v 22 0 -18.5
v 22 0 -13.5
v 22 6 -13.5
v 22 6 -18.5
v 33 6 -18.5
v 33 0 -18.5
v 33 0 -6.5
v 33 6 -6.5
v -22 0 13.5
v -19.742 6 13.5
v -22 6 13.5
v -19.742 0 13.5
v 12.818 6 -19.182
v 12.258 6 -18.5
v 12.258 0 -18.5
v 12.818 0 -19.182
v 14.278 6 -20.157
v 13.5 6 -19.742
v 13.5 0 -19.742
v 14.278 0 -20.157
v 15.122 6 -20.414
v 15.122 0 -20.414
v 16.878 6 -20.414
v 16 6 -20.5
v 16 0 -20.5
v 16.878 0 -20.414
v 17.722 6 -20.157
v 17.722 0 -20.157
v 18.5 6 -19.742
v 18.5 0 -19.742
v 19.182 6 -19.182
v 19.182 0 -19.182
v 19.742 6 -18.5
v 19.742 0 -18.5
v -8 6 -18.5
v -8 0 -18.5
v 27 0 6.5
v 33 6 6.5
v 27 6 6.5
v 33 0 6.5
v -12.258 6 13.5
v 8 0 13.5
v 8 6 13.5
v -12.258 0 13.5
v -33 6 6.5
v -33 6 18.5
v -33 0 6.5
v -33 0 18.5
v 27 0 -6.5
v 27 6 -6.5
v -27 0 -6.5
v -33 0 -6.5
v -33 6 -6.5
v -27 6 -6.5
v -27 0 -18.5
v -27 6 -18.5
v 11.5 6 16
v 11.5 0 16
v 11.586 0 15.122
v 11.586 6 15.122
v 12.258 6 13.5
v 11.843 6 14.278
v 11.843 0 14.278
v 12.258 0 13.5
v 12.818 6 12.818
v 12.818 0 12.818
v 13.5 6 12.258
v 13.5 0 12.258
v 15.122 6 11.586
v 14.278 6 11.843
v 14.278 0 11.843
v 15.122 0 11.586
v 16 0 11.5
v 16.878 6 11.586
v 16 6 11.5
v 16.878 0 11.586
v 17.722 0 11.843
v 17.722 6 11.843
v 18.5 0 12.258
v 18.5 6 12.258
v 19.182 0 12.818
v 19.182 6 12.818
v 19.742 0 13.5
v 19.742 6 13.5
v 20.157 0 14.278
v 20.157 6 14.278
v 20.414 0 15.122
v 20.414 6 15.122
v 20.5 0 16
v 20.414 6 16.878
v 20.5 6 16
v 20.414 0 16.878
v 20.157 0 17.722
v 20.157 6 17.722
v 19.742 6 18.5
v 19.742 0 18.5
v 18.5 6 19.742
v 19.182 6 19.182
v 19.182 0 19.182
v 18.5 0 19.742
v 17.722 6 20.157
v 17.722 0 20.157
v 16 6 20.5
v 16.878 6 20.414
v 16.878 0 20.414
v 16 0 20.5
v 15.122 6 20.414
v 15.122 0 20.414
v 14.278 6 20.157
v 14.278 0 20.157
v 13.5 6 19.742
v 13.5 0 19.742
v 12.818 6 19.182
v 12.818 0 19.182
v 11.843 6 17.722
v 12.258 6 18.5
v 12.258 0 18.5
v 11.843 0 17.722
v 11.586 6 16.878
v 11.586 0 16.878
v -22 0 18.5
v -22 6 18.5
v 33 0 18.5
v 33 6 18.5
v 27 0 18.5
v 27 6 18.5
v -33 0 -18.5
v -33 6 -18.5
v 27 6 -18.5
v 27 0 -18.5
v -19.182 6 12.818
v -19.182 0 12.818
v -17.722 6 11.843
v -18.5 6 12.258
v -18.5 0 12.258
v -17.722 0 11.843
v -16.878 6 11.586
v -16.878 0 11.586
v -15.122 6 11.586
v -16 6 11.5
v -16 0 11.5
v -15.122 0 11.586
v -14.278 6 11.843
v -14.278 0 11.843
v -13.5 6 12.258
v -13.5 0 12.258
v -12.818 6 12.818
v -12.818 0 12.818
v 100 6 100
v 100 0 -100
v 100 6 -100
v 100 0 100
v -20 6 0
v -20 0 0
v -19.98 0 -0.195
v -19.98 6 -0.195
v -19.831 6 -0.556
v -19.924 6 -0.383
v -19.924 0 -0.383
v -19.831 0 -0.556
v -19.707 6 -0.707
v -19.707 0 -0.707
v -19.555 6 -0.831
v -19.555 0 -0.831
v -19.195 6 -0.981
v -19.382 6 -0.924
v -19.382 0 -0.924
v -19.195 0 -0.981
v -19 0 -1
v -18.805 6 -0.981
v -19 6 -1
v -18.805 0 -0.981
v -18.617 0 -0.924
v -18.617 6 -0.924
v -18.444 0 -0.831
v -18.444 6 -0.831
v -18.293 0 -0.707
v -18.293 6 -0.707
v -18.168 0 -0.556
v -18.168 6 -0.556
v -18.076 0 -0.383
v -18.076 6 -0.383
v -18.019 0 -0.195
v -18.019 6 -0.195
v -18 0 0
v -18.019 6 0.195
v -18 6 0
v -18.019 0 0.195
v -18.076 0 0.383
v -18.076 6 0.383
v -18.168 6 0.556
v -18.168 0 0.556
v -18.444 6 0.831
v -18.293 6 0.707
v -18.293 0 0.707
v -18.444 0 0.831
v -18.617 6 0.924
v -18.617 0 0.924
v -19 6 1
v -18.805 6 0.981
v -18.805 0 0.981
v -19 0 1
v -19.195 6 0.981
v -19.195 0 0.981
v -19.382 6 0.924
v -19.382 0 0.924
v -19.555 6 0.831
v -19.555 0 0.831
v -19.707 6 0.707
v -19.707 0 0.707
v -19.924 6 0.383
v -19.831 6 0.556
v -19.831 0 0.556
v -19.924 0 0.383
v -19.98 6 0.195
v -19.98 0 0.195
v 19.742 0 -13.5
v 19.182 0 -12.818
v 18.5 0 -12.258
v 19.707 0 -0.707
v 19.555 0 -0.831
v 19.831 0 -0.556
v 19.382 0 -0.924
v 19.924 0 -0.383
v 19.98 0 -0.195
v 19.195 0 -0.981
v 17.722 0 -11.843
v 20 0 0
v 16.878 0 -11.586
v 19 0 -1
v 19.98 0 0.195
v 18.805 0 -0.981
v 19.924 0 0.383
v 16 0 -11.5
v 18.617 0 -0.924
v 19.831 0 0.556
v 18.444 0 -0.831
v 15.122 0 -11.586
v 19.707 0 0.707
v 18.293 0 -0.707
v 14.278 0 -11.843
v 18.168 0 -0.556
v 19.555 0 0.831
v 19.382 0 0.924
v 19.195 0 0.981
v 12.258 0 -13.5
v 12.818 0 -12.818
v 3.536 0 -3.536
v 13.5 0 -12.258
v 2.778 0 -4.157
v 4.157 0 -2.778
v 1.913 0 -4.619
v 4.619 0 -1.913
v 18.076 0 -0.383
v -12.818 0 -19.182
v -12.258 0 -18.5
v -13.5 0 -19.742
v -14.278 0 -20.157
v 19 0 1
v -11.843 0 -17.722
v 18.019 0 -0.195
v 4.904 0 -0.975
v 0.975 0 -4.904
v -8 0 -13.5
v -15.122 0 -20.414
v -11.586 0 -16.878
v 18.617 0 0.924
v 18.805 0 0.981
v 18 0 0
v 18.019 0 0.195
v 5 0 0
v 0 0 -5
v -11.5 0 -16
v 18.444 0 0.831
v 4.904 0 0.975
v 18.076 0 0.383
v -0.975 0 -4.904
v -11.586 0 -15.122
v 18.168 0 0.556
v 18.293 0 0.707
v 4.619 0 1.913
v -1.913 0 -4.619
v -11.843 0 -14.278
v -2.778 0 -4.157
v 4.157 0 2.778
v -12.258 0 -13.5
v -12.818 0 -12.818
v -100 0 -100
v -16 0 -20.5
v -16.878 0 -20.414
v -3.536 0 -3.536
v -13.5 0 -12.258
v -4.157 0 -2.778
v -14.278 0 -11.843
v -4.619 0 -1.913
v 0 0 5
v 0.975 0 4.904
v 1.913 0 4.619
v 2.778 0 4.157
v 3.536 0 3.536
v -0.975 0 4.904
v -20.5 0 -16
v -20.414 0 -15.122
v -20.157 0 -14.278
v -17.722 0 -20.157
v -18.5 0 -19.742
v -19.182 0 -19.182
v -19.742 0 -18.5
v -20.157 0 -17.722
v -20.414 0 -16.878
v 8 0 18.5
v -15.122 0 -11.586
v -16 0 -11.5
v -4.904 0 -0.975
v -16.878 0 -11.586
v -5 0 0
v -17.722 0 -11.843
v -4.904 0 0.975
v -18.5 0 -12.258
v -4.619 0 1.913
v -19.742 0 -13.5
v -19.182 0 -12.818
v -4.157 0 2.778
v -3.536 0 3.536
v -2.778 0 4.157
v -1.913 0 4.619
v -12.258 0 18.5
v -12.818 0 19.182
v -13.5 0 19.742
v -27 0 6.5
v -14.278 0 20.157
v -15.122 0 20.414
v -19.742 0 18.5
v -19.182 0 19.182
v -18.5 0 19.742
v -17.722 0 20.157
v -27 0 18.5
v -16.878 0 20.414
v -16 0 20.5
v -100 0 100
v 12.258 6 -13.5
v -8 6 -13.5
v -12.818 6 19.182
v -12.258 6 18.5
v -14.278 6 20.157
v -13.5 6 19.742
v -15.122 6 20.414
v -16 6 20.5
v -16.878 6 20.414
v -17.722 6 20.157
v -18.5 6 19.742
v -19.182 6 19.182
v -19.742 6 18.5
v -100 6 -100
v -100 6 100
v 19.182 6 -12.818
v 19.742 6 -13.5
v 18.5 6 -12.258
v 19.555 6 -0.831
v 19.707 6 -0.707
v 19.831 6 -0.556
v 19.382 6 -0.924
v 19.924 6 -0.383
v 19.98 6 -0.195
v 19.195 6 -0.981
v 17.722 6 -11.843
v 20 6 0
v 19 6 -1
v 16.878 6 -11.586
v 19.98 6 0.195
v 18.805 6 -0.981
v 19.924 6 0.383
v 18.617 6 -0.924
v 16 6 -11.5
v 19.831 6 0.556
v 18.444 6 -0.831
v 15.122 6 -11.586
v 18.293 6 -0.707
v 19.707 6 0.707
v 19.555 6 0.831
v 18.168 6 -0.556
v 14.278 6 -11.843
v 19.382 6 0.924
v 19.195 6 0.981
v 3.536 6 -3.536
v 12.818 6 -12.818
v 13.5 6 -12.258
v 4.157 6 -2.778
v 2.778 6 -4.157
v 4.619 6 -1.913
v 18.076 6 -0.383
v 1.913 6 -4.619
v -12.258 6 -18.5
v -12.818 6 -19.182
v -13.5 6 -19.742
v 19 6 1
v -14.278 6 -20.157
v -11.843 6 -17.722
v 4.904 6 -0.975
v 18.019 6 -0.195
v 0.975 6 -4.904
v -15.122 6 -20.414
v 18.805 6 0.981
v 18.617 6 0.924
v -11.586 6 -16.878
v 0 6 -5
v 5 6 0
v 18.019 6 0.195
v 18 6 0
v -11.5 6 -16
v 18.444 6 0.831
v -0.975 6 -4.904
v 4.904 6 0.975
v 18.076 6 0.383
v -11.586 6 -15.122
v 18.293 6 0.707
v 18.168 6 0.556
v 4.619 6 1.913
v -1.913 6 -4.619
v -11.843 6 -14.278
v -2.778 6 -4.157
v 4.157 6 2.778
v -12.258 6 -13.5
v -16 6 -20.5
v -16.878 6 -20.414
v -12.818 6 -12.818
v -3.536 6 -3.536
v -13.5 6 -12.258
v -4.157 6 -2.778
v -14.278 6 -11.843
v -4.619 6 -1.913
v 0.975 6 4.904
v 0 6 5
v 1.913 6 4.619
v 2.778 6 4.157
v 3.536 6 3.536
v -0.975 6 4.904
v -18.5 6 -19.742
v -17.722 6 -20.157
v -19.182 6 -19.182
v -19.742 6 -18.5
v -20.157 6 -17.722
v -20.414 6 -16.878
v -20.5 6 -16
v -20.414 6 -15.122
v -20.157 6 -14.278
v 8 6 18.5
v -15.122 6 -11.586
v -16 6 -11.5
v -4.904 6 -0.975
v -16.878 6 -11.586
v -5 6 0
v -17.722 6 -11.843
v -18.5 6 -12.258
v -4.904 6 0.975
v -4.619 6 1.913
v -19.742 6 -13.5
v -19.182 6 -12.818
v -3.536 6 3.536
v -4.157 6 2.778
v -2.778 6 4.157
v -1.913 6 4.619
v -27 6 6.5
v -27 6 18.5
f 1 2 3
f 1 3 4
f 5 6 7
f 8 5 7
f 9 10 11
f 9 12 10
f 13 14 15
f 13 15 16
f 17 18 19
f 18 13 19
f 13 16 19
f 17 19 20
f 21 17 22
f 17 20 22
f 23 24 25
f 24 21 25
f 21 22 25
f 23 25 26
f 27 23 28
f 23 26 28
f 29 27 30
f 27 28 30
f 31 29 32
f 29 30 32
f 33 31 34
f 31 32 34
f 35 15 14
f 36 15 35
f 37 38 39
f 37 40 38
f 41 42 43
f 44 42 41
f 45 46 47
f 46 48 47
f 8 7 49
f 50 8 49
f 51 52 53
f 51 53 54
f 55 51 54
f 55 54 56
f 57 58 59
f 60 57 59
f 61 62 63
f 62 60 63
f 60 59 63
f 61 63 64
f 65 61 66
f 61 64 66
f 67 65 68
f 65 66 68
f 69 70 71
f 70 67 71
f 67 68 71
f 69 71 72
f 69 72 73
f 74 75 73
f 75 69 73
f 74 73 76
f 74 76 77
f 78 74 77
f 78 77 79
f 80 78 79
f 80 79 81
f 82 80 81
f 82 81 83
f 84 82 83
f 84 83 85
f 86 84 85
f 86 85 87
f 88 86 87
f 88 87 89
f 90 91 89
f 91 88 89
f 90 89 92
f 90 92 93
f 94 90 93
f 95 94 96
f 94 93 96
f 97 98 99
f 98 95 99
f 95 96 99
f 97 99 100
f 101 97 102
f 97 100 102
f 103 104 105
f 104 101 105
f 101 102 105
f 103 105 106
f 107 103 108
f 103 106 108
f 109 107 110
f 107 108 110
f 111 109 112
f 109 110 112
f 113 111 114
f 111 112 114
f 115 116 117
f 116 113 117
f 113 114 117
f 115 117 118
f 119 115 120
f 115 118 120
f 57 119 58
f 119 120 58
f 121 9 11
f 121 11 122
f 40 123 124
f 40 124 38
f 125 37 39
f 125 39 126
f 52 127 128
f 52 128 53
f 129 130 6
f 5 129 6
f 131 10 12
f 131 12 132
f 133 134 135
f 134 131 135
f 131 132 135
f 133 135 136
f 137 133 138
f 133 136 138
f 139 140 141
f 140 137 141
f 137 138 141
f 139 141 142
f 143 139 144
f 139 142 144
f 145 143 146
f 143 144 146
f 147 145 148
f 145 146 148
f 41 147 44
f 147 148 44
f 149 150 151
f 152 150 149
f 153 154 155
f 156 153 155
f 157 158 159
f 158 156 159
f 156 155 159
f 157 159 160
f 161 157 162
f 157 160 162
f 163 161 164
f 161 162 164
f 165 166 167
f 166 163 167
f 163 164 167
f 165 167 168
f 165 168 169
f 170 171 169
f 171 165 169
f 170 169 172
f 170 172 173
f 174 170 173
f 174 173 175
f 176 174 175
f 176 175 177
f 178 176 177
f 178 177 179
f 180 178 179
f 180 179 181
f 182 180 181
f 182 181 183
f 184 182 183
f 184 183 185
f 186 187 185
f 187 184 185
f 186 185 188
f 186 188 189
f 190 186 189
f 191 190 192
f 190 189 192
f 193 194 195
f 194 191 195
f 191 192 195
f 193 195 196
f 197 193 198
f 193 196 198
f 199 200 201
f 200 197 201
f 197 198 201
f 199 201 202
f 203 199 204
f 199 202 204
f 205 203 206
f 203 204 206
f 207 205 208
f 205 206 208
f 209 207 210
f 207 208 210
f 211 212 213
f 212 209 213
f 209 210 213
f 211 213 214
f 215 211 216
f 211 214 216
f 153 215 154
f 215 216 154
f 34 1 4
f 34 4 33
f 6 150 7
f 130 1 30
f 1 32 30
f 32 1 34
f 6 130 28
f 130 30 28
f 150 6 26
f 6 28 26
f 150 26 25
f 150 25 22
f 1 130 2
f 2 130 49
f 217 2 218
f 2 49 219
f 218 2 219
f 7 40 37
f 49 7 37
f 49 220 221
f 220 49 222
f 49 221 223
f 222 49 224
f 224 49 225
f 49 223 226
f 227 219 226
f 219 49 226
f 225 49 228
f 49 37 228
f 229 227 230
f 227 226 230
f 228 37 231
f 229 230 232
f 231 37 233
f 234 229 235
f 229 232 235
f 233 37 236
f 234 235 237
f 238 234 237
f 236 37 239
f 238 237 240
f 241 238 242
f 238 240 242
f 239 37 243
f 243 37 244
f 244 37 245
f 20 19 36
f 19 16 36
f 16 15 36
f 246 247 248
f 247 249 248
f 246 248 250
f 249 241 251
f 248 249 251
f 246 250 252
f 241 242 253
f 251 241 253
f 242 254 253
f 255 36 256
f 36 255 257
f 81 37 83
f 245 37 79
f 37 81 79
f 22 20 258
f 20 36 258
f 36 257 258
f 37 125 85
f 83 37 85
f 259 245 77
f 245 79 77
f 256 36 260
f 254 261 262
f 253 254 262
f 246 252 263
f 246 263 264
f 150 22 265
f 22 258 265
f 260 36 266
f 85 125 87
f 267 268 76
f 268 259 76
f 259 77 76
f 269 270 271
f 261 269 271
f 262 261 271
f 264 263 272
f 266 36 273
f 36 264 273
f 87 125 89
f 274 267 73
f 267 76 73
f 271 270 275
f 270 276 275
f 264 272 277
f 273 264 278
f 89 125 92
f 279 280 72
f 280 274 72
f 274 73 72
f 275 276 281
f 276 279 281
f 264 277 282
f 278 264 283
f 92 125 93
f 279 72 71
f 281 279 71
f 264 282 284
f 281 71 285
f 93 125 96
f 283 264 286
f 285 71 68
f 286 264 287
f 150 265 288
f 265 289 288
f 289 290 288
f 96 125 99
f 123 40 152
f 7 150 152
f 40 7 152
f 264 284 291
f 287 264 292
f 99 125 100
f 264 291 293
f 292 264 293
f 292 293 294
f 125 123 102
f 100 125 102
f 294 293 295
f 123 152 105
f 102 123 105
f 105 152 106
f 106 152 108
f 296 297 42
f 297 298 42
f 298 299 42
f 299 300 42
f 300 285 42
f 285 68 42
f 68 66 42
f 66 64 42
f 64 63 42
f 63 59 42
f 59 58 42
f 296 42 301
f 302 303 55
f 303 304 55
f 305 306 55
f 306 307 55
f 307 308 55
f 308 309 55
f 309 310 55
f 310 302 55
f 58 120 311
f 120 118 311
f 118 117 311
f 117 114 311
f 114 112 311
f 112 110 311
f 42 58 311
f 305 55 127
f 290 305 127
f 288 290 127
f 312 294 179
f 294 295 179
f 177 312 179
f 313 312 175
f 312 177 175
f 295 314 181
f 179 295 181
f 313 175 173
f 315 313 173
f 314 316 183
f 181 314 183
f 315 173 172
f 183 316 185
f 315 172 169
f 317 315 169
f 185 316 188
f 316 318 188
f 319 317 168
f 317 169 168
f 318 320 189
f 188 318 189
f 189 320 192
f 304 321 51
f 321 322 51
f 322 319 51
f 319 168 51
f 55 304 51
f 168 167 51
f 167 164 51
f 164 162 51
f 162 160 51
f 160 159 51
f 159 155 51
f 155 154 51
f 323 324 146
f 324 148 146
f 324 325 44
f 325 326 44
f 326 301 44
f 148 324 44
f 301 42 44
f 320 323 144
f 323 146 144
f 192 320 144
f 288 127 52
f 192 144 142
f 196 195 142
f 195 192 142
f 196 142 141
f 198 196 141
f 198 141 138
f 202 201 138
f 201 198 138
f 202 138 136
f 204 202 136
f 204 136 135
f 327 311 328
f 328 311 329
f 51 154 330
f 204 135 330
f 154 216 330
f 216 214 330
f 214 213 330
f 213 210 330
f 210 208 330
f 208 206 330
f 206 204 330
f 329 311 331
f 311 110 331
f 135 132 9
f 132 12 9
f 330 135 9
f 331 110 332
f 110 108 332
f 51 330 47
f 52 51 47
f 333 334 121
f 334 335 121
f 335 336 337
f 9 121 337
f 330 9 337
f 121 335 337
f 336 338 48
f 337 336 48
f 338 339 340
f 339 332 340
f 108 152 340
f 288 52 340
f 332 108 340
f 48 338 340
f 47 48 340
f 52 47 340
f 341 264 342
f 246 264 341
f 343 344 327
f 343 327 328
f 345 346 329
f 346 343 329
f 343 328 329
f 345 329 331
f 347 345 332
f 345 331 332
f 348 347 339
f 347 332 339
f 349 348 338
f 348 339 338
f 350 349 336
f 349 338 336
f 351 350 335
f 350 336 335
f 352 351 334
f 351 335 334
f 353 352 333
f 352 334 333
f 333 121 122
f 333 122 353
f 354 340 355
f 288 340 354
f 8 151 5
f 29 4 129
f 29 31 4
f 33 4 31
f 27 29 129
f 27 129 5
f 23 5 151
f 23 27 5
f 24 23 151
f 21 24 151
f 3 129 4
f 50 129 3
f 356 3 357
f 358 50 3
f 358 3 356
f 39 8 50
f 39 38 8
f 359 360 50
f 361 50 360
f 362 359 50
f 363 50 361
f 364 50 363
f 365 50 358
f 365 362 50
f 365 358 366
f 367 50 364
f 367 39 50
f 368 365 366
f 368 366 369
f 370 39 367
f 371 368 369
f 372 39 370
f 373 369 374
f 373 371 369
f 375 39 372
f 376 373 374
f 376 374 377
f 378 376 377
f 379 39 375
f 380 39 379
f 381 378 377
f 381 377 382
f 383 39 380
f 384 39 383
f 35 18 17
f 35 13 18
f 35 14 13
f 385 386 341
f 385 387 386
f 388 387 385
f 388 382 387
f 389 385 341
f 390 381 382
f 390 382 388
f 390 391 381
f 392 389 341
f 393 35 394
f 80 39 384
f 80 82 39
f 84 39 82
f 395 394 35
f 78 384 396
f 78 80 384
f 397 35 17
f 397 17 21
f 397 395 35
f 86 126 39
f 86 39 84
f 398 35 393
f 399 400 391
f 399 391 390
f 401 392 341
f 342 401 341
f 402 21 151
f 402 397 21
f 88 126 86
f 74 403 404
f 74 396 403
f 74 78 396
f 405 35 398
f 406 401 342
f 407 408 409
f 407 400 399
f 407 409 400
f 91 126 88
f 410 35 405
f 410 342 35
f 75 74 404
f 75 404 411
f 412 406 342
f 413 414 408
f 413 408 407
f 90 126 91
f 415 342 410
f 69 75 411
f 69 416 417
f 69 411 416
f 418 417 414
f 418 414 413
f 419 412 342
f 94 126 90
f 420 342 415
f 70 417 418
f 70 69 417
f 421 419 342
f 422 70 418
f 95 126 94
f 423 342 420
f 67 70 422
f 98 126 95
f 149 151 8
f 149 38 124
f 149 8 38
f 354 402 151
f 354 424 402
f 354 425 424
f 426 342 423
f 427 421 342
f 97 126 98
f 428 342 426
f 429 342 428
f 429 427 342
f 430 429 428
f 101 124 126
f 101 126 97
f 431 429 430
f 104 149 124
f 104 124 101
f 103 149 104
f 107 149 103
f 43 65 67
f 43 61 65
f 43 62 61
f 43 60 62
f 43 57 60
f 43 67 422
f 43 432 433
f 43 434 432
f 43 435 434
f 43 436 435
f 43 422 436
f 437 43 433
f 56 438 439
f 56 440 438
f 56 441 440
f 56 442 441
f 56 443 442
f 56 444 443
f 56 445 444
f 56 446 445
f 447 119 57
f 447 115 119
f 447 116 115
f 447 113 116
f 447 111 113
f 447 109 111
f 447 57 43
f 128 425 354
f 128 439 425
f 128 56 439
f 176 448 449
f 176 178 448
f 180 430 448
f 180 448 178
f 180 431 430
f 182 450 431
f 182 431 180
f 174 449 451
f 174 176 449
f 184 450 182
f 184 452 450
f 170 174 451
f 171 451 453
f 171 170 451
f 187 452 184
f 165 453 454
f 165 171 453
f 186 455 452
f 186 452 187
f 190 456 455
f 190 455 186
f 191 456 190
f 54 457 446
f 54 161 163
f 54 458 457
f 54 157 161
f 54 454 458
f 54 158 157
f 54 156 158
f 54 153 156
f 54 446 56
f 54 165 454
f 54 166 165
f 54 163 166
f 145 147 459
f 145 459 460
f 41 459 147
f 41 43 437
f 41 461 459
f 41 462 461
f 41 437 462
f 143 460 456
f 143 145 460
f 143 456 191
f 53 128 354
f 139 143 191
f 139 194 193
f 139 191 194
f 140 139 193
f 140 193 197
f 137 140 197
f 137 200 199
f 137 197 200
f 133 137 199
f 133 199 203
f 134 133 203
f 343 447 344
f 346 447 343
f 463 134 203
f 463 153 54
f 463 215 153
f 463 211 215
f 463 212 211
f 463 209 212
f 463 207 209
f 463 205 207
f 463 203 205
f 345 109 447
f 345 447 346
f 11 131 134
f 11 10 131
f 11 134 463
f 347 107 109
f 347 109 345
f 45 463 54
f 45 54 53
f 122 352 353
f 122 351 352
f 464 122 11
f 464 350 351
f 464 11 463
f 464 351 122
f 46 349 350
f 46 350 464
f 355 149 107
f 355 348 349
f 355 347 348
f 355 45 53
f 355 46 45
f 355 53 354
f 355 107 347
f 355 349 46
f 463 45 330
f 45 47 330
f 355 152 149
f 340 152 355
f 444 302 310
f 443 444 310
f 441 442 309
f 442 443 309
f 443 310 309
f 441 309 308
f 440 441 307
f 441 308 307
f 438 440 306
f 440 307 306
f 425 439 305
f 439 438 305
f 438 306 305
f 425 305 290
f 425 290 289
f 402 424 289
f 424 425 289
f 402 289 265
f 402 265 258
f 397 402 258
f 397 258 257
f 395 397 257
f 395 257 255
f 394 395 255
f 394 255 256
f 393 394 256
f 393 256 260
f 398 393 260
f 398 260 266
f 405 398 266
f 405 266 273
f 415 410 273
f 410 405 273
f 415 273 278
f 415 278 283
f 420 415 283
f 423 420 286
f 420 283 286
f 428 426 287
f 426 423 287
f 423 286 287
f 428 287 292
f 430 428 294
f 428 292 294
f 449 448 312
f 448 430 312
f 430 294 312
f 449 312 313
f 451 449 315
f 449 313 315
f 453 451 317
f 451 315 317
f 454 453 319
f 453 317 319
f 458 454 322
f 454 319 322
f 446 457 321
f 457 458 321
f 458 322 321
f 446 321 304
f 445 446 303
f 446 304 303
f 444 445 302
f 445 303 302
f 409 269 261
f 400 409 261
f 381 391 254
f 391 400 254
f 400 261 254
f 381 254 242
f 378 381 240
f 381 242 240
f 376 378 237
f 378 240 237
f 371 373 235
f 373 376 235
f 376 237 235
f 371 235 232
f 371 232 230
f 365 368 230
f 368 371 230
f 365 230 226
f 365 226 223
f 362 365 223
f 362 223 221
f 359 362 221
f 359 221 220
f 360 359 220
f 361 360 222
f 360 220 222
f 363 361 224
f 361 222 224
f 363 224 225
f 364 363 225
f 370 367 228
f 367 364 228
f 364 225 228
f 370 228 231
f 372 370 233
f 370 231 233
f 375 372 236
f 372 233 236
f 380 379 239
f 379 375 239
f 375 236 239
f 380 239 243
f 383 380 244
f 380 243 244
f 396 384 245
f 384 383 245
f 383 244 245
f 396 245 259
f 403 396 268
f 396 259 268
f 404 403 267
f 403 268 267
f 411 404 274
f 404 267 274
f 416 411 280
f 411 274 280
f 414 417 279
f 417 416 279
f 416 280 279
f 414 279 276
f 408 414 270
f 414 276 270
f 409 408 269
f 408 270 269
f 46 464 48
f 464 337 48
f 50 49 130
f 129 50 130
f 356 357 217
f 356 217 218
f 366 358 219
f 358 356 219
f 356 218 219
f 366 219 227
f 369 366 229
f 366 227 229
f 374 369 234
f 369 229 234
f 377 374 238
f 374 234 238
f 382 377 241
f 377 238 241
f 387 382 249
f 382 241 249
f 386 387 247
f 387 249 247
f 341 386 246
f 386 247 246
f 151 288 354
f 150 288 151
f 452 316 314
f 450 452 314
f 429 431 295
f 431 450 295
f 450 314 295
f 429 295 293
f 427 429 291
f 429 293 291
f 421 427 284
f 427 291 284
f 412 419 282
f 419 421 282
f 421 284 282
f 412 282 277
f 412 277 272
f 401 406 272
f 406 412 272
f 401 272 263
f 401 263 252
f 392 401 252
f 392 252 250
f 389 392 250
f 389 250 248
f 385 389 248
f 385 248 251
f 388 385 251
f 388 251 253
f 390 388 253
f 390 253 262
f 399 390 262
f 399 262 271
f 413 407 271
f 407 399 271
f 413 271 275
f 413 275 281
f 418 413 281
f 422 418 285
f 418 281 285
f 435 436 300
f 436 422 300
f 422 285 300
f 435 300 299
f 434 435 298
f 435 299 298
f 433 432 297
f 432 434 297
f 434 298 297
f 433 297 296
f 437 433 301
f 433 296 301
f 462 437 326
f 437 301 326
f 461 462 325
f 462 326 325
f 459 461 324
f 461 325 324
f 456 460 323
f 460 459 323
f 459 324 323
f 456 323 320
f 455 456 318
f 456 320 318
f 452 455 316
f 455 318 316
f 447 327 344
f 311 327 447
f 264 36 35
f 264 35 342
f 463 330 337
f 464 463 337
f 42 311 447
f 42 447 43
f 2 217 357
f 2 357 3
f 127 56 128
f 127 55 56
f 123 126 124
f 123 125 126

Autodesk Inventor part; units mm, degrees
ref_plane "YZ Plane" through (0, 0, 0) normal (1, 0, 0) x (0, 1, 0)
ref_plane "XZ Plane" through (0, 0, 0) normal (0, 1, 0) x (-1, 0, 0)
ref_plane "XY Plane" through (0, 0, 0) normal (0, 0, 1) x (1, 0, 0)
sketch "Sketch1" plane through (0, 0, 0) normal (0, 1, 0) x (-1, 0, 0)
  point P0 (0, 0)
sketch "Sketch2" plane through (0, 0, 0) normal (0, 1, 0) x (-1, 0, 0)
  line L0 (-100, 100) -> (100, 100)
  line L1 (100, 100) -> (100, -100)
  line L2 (100, -100) -> (-100, -100)
  line L3 (-100, -100) -> (-100, 100)
  line L4 (-100, 100) -> (100, -100) construction
  line L5 (100, 100) -> (-100, -100) construction
  line L6 (27, -18.5) -> (33, -18.5)
  line L7 (33, -18.5) -> (33, -6.5)
  line L8 (33, -6.5) -> (27, -6.5)
  line L9 (27, -6.5) -> (27, -18.5)
  line L10 (27, -18.5) -> (33, -6.5) construction
  line L11 (33, -18.5) -> (27, -6.5) construction
  line L12 (0, 100) -> (0, -100) construction
  line L13 (100, 0) -> (-100, 0) construction
  circle A0 centre (0, 0) radius 5
  circle A1 centre (16, -16) radius 4.5
  circle A2 centre (-16, 16) radius 4.5
  line L14 (8, -13.5) -> (-22, -13.5)
  line L15 (-22, -13.5) -> (-22, -18.5)
  line L16 (-22, -18.5) -> (8, -18.5)
  line L17 (8, -18.5) -> (8, -13.5)
  line L18 (-8, 13.5) -> (22, 13.5)
  line L19 (22, 13.5) -> (22, 18.5)
  line L20 (22, 18.5) -> (-8, 18.5)
  line L21 (-8, 18.5) -> (-8, 13.5)
  circle A3 centre (18.9997, 0) radius 1
  circle A4 centre (-18.9997, 0) radius 1
  line L22 (27, 18.5) -> (33, 18.5)
  line L23 (33, 18.5) -> (33, 6.5)
  line L24 (33, 6.5) -> (27, 6.5)
  line L25 (27, 6.5) -> (27, 18.5)
  line L26 (27, 18.5) -> (33, 6.5) construction
  line L27 (33, 18.5) -> (27, 6.5) construction
  line L28 (-27, -18.5) -> (-33, -18.5)
  line L29 (-33, -18.5) -> (-33, -6.5)
  line L30 (-33, -6.5) -> (-27, -6.5)
  line L31 (-27, -6.5) -> (-27, -18.5)
  line L32 (-27, -18.5) -> (-33, -6.5) construction
  line L33 (-33, -18.5) -> (-27, -6.5) construction
  line L34 (-27, 6.5) -> (-27, 18.5)
  line L35 (-27, 18.5) -> (-33, 18.5)
  line L36 (-33, 18.5) -> (-33, 6.5)
  line L37 (-27, 18.5) -> (-33, 6.5) construction
  line L38 (-33, 18.5) -> (-27, 6.5) construction
  line L39 (-33, 6.5) -> (-27, 6.5)
  circle A5 centre (16, 16) radius 4.5
  circle A6 centre (-16, -16) radius 4.5
  point P0 (30, -12.5)
  point P1 (30, 12.5)
  point P2 (-30, -12.5)
  point P3 (-30, 12.5)
  dimension "d0" = 200
  dimension "d1" = 200
  dimension "d3" = 12
  dimension "d5" = 10
  dimension "d8" = 9
  dimension "d10" = 16
  dimension "d11" = 16
  dimension "d15" = 30
  dimension "d16" = 5
  dimension "d17" = 13.5
  dimension "d18" = 8
  dimension "d19" = 30
  dimension "d20" = 5
  dimension "d21" = 13.5
  dimension "d22" = 8
  dimension "d23" = 2
  dimension "d24" = 8.0003
  dimension "d27" = 6
  dimension "d30" = 30
extrude "Extrusion1" add sketch "Sketch2" along normal blind 6
properties part number "thumper-base-v2"
